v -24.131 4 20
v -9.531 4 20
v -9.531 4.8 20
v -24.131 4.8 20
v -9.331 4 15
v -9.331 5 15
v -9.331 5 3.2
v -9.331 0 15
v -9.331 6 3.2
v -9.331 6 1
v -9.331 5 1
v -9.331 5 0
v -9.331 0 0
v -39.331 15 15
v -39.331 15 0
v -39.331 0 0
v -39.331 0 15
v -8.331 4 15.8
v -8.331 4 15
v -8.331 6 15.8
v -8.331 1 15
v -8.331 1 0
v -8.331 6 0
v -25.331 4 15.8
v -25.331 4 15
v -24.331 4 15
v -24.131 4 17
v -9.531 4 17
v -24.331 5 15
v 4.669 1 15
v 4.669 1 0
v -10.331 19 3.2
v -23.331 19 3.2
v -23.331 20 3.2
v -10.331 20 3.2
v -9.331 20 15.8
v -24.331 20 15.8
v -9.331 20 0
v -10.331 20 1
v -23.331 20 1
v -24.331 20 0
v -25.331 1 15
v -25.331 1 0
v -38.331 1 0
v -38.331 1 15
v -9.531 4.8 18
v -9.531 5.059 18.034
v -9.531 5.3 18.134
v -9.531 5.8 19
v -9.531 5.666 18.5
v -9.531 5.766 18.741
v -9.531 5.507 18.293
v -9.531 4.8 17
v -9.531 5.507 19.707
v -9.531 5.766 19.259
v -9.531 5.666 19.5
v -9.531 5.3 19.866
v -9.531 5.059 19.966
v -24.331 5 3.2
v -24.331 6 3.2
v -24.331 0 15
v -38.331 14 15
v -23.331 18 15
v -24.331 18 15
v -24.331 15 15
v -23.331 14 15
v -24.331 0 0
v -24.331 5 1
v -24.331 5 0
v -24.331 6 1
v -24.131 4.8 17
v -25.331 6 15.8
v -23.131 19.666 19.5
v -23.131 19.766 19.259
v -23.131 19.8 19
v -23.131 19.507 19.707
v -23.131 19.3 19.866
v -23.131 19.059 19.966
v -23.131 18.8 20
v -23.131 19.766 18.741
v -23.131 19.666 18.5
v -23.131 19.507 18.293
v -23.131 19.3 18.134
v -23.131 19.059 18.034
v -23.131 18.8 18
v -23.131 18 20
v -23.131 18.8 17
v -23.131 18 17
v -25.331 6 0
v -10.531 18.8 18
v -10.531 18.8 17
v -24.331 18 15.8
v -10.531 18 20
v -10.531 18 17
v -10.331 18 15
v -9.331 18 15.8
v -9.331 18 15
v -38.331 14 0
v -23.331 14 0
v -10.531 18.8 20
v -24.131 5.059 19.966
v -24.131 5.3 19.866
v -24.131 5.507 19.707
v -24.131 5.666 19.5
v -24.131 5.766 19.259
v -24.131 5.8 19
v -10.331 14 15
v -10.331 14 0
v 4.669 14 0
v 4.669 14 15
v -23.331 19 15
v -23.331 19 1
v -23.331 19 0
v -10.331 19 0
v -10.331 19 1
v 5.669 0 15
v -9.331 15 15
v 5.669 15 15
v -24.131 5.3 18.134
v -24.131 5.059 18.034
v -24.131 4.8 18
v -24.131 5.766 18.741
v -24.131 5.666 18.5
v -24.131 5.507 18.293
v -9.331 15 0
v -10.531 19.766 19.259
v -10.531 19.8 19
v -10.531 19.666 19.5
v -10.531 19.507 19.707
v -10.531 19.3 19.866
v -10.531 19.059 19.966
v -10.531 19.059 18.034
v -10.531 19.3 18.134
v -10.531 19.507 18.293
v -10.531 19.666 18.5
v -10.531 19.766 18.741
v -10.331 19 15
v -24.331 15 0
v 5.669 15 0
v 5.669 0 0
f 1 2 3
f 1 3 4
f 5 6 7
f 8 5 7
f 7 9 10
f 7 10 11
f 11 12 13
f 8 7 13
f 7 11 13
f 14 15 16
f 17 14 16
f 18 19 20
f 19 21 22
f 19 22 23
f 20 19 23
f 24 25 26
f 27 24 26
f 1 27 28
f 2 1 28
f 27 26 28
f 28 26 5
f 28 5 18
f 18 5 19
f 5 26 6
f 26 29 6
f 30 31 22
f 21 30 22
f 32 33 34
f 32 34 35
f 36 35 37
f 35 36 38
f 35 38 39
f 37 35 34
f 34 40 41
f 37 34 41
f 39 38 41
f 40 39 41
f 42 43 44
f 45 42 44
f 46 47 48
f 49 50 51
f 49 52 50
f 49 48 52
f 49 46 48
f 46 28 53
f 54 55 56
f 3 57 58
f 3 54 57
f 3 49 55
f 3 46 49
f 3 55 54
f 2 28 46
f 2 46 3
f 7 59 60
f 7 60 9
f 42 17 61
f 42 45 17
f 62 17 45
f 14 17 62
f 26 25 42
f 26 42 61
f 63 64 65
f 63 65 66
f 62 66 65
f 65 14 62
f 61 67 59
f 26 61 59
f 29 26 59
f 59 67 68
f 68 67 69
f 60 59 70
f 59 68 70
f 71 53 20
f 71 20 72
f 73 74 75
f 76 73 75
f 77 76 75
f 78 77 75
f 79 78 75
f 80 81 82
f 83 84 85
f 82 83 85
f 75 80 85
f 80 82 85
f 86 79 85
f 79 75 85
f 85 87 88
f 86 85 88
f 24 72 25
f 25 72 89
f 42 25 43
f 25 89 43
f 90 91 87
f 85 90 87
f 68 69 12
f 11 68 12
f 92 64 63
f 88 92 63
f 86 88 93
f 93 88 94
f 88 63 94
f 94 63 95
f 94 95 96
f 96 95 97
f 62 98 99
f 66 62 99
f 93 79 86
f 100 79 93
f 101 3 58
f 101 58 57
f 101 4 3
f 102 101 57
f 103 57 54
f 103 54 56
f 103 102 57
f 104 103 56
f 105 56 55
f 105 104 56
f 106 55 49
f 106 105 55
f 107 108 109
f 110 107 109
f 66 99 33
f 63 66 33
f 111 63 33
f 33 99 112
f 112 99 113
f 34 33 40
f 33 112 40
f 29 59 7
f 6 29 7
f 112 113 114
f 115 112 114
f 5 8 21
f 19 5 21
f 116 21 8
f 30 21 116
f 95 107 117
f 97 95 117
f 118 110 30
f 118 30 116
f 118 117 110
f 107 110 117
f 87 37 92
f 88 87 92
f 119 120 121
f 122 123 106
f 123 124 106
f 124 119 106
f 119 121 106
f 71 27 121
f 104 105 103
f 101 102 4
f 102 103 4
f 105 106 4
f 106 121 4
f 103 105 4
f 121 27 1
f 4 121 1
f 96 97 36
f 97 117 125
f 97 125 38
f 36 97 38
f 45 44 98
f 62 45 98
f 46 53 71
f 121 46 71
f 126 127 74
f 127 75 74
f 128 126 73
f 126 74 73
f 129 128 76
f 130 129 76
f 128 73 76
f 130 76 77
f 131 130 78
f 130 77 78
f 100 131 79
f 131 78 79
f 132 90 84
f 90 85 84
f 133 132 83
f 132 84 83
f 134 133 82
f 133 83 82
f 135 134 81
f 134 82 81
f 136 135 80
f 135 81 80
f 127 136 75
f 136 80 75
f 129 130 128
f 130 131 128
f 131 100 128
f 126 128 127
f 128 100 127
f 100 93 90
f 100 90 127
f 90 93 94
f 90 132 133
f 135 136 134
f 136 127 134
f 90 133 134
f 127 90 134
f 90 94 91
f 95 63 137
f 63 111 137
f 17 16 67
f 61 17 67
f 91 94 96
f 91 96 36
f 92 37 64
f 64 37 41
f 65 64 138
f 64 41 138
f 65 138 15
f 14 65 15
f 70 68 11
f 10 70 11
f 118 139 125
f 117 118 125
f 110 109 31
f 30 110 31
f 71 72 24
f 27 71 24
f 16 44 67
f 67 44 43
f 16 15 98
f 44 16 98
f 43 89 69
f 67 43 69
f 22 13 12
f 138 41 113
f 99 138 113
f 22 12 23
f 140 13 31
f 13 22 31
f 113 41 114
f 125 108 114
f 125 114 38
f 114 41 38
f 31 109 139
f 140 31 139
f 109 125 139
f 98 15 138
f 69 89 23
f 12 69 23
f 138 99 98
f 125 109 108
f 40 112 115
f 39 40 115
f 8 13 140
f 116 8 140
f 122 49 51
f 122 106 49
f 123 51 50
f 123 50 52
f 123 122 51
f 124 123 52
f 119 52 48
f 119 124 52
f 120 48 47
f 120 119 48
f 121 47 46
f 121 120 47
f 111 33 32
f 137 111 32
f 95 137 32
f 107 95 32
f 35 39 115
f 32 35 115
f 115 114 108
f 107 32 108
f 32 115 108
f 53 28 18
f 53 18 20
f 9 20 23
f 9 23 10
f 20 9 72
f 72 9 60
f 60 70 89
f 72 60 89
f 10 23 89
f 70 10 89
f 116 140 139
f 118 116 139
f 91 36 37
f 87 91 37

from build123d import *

# Parameters (mm, degrees)
F3_DEPTH  = 15
F4_W      = 1
F4_H      = 1
F4_W_2    = 15
F4_W_3    = 13
F5_DEPTH  = 2
F6_SIZE   = 1.2
F7_DEPTH  = 3
F8_W      = 14.6
F8_H      = 2
F9_W      = 12.6
F9_H      = 2
F10_DEPTH = 1
F11_R     = 0.99999
F12_W     = 15
F12_H     = 2.2
F13_W     = 13
F13_H     = 2.2
F14_DEPTH = 1


# Not quite as in the source:
# - a fillet or chamfer is up to 0.001 mm smaller than in the source, because OpenCascade refuses the exact size


with BuildPart() as f3:
    # F2 (on Top) → F3 (new body)
    with BuildSketch(Plane.XY):
        Polygon((-39.3307432532, 0), (-24.3307432532, 0), (-24.3307432532, 5), (-24.3307432532, 6), (-25.3307432532, 6), (-25.3307432532, 1), (-38.3307432532, 1), (-38.3307432532, 14), (-25.3307432532, 14), (-24.3307432532, 14), (-24.3307432532, 15), (-39.3307432532, 15), align=None)
        Polygon((-24.3307432532, 6), (-24.3307432532, 5), (-9.3307432532, 5), (-9.3307432532, 6), (-10.3307432532, 6), (-23.3307432532, 6), align=None)
        Polygon((-9.3307432532, 6), (-9.3307432532, 5), (-9.3307432532, 0), (5.6692567468, 0), (5.6692567468, 15), (-9.3307432532, 15), (-9.3307432532, 14), (-8.3307432532, 14), (4.6692567468, 14), (4.6692567468, 1), (-8.3307432532, 1), (-8.3307432532, 6), align=None)
        Polygon((-24.3307432532, 20), (-24.3307432532, 15), (-24.3307432532, 14), (-23.3307432532, 14), (-23.3307432532, 19), (-10.3307432532, 19), (-10.3307432532, 14), (-9.3307432532, 14), (-9.3307432532, 15), (-9.3307432532, 20), align=None)
    extrude(amount=F3_DEPTH)

    # F4 (on face) → F5 (join)
    with BuildSketch(Plane.XY.offset(15)):
        Polygon((-8.3307432532, 6), (-25.3307432532, 6), (-25.3307432532, 5), (-24.3307432532, 5), (-9.3307432532, 5), (-8.3307432532, 5), align=None)
        with Locations((-8.8307432532, 4.5)):
            Rectangle(F4_W, F4_H)
        with Locations((-16.8307432532, 4.5)):
            Rectangle(F4_W_2, F4_H)
        with Locations((-24.8307432532, 4.5)):
            Rectangle(F4_W, F4_H)
        Polygon((-24.3307432532, 19), (-23.3307432532, 19), (-10.3307432532, 19), (-9.3307432532, 19), (-9.3307432532, 20), (-24.3307432532, 20), align=None)
        with Locations((-23.8307432532, 18.5)):
            Rectangle(F4_W, F4_H)
        with Locations((-16.8307432532, 18.5)):
            Rectangle(F4_W_3, F4_H)
        with Locations((-9.8307432532, 18.5)):
            Rectangle(F4_W, F4_H)
    extrude(amount=F5_DEPTH)

    # F6
    f6_edges = [f3.edges().sort_by_distance(p)[0] for p in [
        (-16.830743, 6, 17),
        (-25.330743, 5, 17),
        (-8.330743, 5, 17),
        (-16.830743, 20, 17),
        (-24.330743, 19, 17),
        (-9.330743, 19, 17),
    ]]
    chamfer(f6_edges, length=F6_SIZE)

    # F7 (add): faces of the model
    f7_faces = [f3.faces().sort_by_distance(p)[0] for p in [
        (-16.8307432532, 4.4, 17),
        (-16.8307432532, 18.4, 17),
    ]]
    extrude(f7_faces, amount=F7_DEPTH)

    # F8 (on face) + F9 (on face) → F10 (join)
    with BuildSketch(Plane(origin=(0, 4.8, 0), x_dir=(-1, 0, 0), z_dir=(0, 1, 0))):
        with Locations((16.8307432532, 19)):
            Rectangle(F8_W, F8_H)
    with BuildSketch(Plane(origin=(0, 18.8, 0), x_dir=(-1, 0, 0), z_dir=(0, 1, 0))):
        with Locations((16.8307432532, 19)):
            Rectangle(F9_W, F9_H)
    extrude(amount=F10_DEPTH)

    # F11 (radius 1 in the source; OpenCascade refuses exactly that, so slightly less here)
    f11_edges = [f3.edges().sort_by_distance(p)[0] for p in [
        (-16.830743, 5.8, 20),
        (-16.830743, 5.8, 18),
        (-16.830743, 19.8, 20),
        (-16.830743, 19.8, 18),
    ]]
    fillet(f11_edges, radius=F11_R)

    # F12 (on face) + F13 (on face) → F14 (cut, through all)
    with BuildSketch(Plane.XZ.offset(-5)):
        with Locations((-16.8307432532, 2.1)):
            Rectangle(F12_W, F12_H)
    with BuildSketch(Plane.XZ.offset(-19)):
        with Locations((-16.8307432532, 2.1)):
            Rectangle(F13_W, F13_H)
    extrude(amount=-F14_DEPTH, mode=Mode.SUBTRACT)


solid = f3.part
